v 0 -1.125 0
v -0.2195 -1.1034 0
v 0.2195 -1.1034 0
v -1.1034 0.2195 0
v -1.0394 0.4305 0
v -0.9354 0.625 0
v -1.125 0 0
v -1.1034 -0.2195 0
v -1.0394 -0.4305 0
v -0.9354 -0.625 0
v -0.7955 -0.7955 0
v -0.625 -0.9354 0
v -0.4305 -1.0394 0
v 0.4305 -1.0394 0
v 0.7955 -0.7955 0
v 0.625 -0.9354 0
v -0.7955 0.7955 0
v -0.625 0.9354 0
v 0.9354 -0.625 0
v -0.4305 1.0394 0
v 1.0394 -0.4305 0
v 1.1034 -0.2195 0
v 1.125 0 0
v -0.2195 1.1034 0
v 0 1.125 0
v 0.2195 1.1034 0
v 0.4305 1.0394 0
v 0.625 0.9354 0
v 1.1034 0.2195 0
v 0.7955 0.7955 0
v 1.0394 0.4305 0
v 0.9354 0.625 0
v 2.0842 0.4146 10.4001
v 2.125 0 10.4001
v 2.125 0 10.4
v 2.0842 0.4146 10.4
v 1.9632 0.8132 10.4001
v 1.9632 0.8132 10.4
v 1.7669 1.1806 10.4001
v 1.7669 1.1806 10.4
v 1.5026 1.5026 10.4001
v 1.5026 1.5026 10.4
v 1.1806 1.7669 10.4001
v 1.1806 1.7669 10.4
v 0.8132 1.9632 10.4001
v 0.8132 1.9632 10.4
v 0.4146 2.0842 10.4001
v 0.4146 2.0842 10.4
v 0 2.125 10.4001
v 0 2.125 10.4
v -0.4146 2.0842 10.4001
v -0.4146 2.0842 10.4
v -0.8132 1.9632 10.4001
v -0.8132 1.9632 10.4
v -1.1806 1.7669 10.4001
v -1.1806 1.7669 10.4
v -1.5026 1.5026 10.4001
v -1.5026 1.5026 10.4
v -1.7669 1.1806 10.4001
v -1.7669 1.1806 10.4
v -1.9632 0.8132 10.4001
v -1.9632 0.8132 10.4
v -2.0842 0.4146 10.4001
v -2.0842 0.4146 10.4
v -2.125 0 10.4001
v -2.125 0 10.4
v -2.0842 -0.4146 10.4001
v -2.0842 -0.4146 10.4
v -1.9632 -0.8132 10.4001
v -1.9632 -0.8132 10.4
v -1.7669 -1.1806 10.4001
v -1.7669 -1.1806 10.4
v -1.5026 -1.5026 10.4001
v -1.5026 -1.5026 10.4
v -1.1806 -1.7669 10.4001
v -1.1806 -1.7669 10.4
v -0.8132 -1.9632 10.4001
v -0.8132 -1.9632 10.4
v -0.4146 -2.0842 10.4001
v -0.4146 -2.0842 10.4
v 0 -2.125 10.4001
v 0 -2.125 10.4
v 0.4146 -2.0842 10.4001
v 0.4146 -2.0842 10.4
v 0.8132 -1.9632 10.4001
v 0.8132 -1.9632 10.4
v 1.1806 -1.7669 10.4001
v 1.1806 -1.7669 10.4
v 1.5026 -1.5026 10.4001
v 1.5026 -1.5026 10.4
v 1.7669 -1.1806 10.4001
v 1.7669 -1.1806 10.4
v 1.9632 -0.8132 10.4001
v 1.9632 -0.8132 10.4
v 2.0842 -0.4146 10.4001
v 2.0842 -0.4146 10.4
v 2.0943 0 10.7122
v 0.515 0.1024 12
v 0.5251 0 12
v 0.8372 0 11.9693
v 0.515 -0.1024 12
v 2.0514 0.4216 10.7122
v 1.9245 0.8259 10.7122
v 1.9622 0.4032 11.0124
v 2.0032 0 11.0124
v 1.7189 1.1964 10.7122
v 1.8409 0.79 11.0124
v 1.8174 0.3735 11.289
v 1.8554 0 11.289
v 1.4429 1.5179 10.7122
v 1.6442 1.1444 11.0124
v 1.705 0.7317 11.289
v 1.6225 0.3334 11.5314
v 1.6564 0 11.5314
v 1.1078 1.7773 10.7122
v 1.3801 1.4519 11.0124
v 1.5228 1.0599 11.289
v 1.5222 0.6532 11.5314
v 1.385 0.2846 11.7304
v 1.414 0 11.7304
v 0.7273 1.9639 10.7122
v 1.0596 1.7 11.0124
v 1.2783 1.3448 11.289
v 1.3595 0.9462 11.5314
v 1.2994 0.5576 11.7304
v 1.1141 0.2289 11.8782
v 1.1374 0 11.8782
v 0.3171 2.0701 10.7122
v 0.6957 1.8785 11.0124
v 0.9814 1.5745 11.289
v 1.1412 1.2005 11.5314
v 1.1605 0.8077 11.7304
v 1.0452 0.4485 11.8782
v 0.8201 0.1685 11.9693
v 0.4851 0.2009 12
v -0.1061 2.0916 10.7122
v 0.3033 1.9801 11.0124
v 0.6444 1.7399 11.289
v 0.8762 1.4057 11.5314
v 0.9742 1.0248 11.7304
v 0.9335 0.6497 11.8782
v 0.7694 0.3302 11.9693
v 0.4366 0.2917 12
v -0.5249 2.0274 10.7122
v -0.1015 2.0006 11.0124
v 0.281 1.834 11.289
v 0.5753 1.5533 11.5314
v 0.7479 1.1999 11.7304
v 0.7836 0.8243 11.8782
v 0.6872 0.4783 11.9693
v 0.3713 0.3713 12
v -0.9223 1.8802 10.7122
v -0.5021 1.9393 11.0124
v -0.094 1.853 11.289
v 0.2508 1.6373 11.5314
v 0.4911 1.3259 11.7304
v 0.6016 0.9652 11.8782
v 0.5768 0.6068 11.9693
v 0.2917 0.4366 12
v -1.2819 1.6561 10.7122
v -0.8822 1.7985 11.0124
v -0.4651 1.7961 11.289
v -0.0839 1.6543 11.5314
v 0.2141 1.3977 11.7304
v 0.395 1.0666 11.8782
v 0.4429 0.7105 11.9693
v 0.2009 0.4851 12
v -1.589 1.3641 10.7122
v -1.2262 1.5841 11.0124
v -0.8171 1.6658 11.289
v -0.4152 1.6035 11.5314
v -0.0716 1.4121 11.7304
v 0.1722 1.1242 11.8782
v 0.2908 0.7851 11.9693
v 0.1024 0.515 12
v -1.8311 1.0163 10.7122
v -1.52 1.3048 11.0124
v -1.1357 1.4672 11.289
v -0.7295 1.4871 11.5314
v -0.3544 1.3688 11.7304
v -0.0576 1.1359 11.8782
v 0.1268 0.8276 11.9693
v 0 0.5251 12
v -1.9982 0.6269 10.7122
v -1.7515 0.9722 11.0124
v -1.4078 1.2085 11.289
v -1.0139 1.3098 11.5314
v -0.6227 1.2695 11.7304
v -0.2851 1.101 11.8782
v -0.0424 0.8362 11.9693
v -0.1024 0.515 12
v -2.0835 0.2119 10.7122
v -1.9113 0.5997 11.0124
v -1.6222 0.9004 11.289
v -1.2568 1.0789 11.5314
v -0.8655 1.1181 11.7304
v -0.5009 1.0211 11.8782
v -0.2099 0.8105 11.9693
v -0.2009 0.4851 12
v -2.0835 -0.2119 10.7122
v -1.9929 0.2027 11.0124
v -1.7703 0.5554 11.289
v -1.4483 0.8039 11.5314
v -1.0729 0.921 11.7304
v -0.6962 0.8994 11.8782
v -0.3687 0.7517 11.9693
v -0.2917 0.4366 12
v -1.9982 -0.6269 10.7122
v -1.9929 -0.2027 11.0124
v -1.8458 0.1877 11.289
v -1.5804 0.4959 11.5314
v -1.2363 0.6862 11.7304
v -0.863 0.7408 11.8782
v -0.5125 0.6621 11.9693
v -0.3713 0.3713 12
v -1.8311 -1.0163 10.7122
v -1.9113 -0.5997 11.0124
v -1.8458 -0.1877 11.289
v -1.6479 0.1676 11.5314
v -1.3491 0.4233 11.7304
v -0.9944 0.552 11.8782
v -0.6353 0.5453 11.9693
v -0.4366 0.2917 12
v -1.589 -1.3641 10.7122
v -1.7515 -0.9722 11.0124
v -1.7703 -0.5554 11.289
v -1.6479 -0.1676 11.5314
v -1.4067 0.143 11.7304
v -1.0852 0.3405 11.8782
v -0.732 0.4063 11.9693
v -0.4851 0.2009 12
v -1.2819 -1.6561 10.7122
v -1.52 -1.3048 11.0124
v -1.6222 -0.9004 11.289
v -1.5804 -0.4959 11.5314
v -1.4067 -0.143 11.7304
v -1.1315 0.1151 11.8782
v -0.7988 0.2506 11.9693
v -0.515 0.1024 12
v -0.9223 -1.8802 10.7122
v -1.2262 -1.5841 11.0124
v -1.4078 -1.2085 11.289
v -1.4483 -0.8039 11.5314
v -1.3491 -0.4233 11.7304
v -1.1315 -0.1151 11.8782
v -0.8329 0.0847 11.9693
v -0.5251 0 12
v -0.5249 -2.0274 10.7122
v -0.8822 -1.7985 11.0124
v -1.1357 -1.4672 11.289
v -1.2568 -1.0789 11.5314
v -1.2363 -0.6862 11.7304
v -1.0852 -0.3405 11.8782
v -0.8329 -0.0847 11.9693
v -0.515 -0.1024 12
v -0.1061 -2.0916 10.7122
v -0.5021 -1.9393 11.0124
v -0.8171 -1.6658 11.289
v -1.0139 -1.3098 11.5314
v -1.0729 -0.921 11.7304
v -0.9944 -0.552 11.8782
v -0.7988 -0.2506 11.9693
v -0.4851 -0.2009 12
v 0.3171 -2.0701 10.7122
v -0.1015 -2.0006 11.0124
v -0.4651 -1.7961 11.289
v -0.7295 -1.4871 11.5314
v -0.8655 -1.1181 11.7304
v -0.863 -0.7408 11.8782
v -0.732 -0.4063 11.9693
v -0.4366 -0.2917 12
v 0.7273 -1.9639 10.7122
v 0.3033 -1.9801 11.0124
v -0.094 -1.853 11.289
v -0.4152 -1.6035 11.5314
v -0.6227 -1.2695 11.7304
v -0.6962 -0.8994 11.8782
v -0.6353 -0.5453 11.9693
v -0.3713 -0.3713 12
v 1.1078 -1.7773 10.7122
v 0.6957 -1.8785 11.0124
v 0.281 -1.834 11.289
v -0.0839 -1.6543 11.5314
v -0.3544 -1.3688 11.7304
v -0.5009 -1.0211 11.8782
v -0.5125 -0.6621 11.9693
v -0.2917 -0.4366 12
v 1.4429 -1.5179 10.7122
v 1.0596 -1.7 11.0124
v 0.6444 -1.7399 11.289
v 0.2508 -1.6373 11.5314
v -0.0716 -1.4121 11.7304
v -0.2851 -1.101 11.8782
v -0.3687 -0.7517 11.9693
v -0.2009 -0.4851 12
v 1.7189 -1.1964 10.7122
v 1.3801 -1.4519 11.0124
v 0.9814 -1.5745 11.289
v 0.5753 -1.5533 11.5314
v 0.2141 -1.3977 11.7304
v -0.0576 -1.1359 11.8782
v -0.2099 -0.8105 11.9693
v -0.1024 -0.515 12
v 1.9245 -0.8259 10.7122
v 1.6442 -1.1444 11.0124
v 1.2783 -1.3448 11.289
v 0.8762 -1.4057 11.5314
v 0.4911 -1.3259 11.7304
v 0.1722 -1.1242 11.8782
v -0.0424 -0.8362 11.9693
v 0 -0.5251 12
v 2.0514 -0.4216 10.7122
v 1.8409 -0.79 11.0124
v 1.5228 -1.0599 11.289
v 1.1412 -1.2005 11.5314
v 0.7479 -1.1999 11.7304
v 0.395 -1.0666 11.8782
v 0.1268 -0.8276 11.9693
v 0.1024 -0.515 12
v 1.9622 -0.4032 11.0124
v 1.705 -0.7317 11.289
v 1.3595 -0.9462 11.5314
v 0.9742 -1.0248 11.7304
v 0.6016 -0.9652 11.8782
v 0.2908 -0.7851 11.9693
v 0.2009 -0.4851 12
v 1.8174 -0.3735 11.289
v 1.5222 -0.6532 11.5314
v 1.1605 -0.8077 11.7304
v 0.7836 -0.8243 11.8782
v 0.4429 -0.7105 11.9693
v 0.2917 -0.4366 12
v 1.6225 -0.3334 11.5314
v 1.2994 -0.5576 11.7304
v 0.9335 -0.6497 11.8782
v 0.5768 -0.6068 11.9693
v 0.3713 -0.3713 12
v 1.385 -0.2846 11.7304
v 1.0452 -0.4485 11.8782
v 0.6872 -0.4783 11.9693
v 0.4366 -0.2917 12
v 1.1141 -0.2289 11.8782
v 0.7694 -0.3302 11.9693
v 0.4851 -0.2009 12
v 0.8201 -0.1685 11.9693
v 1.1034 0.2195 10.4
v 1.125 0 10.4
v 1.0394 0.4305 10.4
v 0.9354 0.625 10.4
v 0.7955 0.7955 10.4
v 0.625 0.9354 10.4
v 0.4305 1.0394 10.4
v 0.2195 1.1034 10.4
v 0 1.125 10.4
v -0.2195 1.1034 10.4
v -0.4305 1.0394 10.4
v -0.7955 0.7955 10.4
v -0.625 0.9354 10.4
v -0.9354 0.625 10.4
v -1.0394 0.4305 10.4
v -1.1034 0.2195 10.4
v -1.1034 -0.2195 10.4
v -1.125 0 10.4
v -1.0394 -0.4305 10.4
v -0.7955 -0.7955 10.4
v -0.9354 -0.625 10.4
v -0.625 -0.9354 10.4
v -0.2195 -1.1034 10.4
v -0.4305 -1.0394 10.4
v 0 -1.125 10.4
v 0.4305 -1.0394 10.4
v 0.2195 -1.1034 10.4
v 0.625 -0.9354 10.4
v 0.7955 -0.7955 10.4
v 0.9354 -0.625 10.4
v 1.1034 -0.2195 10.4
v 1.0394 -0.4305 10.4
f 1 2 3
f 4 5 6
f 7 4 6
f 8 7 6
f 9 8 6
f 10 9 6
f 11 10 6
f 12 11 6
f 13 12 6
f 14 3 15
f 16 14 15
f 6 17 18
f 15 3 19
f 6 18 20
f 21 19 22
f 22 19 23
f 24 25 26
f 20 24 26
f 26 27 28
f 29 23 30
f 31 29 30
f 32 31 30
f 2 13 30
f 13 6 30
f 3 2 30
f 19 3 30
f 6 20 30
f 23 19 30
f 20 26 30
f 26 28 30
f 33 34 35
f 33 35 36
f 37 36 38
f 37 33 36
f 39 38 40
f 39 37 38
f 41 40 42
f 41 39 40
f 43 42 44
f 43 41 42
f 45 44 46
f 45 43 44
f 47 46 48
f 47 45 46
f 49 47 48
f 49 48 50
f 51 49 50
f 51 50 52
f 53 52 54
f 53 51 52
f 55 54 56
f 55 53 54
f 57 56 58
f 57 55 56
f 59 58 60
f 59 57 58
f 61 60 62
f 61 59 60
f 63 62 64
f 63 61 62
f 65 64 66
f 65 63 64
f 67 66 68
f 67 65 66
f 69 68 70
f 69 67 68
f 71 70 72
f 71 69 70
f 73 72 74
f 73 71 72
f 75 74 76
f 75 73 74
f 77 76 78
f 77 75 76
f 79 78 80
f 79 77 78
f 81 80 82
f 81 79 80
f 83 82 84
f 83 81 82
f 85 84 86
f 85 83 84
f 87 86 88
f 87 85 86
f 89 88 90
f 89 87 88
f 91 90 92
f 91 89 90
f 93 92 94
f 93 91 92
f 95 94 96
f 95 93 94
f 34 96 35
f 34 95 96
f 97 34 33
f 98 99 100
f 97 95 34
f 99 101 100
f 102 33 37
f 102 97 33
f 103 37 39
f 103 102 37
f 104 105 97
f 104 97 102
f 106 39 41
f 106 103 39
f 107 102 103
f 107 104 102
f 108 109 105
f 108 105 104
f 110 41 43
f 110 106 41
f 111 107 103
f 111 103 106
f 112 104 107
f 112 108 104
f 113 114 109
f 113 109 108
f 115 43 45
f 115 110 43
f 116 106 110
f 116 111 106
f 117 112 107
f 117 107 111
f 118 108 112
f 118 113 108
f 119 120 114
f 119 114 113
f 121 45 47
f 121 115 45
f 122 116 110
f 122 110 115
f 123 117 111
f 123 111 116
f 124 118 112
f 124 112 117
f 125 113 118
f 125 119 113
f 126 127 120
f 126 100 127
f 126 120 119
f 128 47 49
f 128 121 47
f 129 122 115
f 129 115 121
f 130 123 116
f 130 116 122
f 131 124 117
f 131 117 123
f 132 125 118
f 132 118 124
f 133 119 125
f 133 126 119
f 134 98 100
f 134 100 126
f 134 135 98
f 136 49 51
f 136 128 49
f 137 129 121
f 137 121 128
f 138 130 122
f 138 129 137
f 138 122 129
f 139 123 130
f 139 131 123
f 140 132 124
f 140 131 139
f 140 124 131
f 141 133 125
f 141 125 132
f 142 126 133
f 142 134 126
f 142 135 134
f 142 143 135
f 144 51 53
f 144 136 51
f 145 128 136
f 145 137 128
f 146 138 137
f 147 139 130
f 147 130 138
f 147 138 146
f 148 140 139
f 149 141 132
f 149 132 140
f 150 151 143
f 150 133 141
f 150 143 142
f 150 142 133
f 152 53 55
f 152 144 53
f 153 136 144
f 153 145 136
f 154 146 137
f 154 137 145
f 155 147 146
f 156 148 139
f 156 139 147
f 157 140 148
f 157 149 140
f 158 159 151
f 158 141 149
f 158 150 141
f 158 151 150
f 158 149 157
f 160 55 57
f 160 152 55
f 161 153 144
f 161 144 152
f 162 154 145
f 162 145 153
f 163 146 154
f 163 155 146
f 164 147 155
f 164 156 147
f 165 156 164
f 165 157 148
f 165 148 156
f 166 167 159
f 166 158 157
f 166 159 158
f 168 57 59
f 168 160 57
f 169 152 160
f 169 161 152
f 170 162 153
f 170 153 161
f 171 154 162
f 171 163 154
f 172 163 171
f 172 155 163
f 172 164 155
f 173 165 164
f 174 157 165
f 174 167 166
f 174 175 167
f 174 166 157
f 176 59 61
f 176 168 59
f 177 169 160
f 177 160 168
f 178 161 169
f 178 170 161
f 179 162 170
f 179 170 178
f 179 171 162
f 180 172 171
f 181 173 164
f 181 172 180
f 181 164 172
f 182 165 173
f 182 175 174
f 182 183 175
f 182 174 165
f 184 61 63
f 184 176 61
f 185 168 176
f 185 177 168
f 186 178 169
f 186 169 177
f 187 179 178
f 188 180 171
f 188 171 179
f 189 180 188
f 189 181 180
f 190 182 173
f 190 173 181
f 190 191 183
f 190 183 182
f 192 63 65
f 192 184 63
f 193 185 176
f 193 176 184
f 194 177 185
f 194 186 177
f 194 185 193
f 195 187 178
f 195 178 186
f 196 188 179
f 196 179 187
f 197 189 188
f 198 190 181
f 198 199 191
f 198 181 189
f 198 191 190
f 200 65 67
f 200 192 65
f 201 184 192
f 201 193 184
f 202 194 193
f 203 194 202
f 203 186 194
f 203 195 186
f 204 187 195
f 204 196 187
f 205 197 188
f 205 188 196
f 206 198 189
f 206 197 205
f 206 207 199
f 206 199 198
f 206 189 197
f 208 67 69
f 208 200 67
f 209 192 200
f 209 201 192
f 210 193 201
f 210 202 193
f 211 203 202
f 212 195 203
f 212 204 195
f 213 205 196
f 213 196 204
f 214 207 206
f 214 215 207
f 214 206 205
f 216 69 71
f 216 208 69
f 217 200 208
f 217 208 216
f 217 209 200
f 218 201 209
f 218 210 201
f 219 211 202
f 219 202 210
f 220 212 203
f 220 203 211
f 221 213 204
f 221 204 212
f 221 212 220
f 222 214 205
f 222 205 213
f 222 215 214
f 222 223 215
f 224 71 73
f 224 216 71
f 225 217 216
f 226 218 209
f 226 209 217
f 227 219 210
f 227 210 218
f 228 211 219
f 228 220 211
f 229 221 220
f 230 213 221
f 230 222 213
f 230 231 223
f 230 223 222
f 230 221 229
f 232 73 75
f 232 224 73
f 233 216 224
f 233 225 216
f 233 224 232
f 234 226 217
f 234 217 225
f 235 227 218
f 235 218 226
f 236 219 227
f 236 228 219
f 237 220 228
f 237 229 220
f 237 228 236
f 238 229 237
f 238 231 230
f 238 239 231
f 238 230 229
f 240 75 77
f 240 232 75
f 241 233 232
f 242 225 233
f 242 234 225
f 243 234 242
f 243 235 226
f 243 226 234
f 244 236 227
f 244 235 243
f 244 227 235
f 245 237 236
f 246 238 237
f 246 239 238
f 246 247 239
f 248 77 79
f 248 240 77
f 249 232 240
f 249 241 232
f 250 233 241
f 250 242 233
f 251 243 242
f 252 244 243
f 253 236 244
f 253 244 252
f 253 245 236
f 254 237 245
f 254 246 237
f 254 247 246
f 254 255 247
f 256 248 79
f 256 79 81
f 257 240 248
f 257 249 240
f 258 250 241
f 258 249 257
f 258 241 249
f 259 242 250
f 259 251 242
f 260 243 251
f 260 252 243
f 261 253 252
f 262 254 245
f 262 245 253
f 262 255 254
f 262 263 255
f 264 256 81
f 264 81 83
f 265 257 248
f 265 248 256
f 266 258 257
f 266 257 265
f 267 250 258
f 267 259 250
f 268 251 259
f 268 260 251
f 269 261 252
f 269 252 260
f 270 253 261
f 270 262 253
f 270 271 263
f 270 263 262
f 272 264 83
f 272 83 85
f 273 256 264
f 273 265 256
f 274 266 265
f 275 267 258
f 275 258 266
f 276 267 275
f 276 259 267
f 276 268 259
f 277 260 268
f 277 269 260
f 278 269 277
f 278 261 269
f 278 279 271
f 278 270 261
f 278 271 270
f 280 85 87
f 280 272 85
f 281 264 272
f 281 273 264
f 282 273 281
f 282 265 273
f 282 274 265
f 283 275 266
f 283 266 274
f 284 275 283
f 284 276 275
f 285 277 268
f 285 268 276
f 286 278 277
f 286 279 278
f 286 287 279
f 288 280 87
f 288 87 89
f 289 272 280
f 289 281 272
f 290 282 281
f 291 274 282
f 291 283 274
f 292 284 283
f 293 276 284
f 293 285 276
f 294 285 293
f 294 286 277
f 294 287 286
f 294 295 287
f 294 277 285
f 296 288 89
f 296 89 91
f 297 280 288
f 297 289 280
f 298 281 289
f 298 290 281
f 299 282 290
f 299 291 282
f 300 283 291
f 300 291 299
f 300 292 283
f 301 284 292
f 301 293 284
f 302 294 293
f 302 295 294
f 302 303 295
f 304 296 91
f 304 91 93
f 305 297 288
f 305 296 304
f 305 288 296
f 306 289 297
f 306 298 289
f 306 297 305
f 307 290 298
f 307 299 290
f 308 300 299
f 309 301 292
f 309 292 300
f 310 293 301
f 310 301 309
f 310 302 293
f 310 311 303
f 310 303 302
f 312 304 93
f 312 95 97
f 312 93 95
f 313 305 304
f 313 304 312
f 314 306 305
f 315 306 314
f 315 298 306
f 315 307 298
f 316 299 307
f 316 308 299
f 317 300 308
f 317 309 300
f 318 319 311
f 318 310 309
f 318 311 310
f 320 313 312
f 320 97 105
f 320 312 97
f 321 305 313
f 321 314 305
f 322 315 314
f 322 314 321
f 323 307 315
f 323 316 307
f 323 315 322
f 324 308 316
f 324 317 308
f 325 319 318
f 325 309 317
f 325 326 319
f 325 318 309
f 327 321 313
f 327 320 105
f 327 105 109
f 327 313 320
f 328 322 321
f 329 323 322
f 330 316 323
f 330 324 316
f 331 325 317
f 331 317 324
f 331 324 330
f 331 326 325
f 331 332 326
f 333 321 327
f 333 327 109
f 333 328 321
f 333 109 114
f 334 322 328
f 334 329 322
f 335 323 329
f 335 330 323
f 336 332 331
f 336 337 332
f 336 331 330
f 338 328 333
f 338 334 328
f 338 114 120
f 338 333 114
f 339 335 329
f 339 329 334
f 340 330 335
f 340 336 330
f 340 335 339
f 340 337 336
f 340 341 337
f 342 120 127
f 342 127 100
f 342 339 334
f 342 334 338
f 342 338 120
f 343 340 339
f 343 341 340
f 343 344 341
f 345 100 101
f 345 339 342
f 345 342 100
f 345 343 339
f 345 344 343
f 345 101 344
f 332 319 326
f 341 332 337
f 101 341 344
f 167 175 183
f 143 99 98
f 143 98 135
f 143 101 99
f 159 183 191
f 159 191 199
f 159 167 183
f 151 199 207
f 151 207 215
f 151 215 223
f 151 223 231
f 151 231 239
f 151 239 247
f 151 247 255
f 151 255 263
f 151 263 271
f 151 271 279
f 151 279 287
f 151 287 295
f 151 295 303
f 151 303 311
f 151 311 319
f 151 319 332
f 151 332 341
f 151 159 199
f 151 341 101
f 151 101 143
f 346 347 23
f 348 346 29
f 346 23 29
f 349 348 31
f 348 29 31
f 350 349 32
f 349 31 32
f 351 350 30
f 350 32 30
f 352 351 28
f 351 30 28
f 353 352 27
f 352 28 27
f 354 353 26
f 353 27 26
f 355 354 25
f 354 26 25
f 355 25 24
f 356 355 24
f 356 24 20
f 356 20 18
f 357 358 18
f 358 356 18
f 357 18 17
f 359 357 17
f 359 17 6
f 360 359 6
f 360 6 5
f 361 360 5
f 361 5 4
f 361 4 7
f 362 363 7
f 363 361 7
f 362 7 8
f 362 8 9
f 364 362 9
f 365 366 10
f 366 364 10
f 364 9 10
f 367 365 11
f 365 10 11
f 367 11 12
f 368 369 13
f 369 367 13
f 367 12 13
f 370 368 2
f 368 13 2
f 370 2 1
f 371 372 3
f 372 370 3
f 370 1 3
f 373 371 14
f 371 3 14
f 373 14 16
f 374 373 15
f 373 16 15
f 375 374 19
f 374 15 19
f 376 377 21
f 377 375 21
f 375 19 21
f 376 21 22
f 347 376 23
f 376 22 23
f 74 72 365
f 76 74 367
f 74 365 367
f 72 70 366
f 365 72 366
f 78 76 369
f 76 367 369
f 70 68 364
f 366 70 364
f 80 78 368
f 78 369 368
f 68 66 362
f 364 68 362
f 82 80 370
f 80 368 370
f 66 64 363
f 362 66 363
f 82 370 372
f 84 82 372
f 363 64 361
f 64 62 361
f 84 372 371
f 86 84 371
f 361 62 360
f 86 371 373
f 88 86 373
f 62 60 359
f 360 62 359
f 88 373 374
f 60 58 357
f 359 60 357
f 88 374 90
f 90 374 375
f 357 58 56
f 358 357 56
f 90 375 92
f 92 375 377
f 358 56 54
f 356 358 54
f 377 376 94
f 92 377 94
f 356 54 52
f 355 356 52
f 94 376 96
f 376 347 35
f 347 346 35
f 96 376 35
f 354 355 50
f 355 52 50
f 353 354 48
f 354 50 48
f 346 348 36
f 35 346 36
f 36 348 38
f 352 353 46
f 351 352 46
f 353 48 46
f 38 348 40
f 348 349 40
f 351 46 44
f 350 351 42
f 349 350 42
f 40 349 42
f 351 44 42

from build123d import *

# Parameters (mm, degrees)
ESBO_O1_R                = 1.125
RESSALTO_EXTRUS_O1_DEPTH = 12
ESBO_O2_R                = 2.125
RESSALTO_EXTRUS_O2_DEPTH = 1.6
FILETE1_R                = 1.6


with BuildPart() as part:
    # Esboço1 → Ressalto-extrusão1 (new body)
    with BuildSketch(Plane.XY):
        Circle(ESBO_O1_R)
    extrude(amount=RESSALTO_EXTRUS_O1_DEPTH)

    # Esboço2 → Ressalto-extrusão2 (add)
    with BuildSketch(Plane.XY.offset(12)):
        Circle(ESBO_O2_R)
    extrude(amount=-RESSALTO_EXTRUS_O2_DEPTH)

    # Filete1
    filete1_edges = [part.edges().sort_by_distance(p)[0] for p in [
        (-2.125, 0, 12),
    ]]
    fillet(filete1_edges, radius=FILETE1_R - 0.0001)  # a hair under: the kernel refuses the full size


solid = part.part
